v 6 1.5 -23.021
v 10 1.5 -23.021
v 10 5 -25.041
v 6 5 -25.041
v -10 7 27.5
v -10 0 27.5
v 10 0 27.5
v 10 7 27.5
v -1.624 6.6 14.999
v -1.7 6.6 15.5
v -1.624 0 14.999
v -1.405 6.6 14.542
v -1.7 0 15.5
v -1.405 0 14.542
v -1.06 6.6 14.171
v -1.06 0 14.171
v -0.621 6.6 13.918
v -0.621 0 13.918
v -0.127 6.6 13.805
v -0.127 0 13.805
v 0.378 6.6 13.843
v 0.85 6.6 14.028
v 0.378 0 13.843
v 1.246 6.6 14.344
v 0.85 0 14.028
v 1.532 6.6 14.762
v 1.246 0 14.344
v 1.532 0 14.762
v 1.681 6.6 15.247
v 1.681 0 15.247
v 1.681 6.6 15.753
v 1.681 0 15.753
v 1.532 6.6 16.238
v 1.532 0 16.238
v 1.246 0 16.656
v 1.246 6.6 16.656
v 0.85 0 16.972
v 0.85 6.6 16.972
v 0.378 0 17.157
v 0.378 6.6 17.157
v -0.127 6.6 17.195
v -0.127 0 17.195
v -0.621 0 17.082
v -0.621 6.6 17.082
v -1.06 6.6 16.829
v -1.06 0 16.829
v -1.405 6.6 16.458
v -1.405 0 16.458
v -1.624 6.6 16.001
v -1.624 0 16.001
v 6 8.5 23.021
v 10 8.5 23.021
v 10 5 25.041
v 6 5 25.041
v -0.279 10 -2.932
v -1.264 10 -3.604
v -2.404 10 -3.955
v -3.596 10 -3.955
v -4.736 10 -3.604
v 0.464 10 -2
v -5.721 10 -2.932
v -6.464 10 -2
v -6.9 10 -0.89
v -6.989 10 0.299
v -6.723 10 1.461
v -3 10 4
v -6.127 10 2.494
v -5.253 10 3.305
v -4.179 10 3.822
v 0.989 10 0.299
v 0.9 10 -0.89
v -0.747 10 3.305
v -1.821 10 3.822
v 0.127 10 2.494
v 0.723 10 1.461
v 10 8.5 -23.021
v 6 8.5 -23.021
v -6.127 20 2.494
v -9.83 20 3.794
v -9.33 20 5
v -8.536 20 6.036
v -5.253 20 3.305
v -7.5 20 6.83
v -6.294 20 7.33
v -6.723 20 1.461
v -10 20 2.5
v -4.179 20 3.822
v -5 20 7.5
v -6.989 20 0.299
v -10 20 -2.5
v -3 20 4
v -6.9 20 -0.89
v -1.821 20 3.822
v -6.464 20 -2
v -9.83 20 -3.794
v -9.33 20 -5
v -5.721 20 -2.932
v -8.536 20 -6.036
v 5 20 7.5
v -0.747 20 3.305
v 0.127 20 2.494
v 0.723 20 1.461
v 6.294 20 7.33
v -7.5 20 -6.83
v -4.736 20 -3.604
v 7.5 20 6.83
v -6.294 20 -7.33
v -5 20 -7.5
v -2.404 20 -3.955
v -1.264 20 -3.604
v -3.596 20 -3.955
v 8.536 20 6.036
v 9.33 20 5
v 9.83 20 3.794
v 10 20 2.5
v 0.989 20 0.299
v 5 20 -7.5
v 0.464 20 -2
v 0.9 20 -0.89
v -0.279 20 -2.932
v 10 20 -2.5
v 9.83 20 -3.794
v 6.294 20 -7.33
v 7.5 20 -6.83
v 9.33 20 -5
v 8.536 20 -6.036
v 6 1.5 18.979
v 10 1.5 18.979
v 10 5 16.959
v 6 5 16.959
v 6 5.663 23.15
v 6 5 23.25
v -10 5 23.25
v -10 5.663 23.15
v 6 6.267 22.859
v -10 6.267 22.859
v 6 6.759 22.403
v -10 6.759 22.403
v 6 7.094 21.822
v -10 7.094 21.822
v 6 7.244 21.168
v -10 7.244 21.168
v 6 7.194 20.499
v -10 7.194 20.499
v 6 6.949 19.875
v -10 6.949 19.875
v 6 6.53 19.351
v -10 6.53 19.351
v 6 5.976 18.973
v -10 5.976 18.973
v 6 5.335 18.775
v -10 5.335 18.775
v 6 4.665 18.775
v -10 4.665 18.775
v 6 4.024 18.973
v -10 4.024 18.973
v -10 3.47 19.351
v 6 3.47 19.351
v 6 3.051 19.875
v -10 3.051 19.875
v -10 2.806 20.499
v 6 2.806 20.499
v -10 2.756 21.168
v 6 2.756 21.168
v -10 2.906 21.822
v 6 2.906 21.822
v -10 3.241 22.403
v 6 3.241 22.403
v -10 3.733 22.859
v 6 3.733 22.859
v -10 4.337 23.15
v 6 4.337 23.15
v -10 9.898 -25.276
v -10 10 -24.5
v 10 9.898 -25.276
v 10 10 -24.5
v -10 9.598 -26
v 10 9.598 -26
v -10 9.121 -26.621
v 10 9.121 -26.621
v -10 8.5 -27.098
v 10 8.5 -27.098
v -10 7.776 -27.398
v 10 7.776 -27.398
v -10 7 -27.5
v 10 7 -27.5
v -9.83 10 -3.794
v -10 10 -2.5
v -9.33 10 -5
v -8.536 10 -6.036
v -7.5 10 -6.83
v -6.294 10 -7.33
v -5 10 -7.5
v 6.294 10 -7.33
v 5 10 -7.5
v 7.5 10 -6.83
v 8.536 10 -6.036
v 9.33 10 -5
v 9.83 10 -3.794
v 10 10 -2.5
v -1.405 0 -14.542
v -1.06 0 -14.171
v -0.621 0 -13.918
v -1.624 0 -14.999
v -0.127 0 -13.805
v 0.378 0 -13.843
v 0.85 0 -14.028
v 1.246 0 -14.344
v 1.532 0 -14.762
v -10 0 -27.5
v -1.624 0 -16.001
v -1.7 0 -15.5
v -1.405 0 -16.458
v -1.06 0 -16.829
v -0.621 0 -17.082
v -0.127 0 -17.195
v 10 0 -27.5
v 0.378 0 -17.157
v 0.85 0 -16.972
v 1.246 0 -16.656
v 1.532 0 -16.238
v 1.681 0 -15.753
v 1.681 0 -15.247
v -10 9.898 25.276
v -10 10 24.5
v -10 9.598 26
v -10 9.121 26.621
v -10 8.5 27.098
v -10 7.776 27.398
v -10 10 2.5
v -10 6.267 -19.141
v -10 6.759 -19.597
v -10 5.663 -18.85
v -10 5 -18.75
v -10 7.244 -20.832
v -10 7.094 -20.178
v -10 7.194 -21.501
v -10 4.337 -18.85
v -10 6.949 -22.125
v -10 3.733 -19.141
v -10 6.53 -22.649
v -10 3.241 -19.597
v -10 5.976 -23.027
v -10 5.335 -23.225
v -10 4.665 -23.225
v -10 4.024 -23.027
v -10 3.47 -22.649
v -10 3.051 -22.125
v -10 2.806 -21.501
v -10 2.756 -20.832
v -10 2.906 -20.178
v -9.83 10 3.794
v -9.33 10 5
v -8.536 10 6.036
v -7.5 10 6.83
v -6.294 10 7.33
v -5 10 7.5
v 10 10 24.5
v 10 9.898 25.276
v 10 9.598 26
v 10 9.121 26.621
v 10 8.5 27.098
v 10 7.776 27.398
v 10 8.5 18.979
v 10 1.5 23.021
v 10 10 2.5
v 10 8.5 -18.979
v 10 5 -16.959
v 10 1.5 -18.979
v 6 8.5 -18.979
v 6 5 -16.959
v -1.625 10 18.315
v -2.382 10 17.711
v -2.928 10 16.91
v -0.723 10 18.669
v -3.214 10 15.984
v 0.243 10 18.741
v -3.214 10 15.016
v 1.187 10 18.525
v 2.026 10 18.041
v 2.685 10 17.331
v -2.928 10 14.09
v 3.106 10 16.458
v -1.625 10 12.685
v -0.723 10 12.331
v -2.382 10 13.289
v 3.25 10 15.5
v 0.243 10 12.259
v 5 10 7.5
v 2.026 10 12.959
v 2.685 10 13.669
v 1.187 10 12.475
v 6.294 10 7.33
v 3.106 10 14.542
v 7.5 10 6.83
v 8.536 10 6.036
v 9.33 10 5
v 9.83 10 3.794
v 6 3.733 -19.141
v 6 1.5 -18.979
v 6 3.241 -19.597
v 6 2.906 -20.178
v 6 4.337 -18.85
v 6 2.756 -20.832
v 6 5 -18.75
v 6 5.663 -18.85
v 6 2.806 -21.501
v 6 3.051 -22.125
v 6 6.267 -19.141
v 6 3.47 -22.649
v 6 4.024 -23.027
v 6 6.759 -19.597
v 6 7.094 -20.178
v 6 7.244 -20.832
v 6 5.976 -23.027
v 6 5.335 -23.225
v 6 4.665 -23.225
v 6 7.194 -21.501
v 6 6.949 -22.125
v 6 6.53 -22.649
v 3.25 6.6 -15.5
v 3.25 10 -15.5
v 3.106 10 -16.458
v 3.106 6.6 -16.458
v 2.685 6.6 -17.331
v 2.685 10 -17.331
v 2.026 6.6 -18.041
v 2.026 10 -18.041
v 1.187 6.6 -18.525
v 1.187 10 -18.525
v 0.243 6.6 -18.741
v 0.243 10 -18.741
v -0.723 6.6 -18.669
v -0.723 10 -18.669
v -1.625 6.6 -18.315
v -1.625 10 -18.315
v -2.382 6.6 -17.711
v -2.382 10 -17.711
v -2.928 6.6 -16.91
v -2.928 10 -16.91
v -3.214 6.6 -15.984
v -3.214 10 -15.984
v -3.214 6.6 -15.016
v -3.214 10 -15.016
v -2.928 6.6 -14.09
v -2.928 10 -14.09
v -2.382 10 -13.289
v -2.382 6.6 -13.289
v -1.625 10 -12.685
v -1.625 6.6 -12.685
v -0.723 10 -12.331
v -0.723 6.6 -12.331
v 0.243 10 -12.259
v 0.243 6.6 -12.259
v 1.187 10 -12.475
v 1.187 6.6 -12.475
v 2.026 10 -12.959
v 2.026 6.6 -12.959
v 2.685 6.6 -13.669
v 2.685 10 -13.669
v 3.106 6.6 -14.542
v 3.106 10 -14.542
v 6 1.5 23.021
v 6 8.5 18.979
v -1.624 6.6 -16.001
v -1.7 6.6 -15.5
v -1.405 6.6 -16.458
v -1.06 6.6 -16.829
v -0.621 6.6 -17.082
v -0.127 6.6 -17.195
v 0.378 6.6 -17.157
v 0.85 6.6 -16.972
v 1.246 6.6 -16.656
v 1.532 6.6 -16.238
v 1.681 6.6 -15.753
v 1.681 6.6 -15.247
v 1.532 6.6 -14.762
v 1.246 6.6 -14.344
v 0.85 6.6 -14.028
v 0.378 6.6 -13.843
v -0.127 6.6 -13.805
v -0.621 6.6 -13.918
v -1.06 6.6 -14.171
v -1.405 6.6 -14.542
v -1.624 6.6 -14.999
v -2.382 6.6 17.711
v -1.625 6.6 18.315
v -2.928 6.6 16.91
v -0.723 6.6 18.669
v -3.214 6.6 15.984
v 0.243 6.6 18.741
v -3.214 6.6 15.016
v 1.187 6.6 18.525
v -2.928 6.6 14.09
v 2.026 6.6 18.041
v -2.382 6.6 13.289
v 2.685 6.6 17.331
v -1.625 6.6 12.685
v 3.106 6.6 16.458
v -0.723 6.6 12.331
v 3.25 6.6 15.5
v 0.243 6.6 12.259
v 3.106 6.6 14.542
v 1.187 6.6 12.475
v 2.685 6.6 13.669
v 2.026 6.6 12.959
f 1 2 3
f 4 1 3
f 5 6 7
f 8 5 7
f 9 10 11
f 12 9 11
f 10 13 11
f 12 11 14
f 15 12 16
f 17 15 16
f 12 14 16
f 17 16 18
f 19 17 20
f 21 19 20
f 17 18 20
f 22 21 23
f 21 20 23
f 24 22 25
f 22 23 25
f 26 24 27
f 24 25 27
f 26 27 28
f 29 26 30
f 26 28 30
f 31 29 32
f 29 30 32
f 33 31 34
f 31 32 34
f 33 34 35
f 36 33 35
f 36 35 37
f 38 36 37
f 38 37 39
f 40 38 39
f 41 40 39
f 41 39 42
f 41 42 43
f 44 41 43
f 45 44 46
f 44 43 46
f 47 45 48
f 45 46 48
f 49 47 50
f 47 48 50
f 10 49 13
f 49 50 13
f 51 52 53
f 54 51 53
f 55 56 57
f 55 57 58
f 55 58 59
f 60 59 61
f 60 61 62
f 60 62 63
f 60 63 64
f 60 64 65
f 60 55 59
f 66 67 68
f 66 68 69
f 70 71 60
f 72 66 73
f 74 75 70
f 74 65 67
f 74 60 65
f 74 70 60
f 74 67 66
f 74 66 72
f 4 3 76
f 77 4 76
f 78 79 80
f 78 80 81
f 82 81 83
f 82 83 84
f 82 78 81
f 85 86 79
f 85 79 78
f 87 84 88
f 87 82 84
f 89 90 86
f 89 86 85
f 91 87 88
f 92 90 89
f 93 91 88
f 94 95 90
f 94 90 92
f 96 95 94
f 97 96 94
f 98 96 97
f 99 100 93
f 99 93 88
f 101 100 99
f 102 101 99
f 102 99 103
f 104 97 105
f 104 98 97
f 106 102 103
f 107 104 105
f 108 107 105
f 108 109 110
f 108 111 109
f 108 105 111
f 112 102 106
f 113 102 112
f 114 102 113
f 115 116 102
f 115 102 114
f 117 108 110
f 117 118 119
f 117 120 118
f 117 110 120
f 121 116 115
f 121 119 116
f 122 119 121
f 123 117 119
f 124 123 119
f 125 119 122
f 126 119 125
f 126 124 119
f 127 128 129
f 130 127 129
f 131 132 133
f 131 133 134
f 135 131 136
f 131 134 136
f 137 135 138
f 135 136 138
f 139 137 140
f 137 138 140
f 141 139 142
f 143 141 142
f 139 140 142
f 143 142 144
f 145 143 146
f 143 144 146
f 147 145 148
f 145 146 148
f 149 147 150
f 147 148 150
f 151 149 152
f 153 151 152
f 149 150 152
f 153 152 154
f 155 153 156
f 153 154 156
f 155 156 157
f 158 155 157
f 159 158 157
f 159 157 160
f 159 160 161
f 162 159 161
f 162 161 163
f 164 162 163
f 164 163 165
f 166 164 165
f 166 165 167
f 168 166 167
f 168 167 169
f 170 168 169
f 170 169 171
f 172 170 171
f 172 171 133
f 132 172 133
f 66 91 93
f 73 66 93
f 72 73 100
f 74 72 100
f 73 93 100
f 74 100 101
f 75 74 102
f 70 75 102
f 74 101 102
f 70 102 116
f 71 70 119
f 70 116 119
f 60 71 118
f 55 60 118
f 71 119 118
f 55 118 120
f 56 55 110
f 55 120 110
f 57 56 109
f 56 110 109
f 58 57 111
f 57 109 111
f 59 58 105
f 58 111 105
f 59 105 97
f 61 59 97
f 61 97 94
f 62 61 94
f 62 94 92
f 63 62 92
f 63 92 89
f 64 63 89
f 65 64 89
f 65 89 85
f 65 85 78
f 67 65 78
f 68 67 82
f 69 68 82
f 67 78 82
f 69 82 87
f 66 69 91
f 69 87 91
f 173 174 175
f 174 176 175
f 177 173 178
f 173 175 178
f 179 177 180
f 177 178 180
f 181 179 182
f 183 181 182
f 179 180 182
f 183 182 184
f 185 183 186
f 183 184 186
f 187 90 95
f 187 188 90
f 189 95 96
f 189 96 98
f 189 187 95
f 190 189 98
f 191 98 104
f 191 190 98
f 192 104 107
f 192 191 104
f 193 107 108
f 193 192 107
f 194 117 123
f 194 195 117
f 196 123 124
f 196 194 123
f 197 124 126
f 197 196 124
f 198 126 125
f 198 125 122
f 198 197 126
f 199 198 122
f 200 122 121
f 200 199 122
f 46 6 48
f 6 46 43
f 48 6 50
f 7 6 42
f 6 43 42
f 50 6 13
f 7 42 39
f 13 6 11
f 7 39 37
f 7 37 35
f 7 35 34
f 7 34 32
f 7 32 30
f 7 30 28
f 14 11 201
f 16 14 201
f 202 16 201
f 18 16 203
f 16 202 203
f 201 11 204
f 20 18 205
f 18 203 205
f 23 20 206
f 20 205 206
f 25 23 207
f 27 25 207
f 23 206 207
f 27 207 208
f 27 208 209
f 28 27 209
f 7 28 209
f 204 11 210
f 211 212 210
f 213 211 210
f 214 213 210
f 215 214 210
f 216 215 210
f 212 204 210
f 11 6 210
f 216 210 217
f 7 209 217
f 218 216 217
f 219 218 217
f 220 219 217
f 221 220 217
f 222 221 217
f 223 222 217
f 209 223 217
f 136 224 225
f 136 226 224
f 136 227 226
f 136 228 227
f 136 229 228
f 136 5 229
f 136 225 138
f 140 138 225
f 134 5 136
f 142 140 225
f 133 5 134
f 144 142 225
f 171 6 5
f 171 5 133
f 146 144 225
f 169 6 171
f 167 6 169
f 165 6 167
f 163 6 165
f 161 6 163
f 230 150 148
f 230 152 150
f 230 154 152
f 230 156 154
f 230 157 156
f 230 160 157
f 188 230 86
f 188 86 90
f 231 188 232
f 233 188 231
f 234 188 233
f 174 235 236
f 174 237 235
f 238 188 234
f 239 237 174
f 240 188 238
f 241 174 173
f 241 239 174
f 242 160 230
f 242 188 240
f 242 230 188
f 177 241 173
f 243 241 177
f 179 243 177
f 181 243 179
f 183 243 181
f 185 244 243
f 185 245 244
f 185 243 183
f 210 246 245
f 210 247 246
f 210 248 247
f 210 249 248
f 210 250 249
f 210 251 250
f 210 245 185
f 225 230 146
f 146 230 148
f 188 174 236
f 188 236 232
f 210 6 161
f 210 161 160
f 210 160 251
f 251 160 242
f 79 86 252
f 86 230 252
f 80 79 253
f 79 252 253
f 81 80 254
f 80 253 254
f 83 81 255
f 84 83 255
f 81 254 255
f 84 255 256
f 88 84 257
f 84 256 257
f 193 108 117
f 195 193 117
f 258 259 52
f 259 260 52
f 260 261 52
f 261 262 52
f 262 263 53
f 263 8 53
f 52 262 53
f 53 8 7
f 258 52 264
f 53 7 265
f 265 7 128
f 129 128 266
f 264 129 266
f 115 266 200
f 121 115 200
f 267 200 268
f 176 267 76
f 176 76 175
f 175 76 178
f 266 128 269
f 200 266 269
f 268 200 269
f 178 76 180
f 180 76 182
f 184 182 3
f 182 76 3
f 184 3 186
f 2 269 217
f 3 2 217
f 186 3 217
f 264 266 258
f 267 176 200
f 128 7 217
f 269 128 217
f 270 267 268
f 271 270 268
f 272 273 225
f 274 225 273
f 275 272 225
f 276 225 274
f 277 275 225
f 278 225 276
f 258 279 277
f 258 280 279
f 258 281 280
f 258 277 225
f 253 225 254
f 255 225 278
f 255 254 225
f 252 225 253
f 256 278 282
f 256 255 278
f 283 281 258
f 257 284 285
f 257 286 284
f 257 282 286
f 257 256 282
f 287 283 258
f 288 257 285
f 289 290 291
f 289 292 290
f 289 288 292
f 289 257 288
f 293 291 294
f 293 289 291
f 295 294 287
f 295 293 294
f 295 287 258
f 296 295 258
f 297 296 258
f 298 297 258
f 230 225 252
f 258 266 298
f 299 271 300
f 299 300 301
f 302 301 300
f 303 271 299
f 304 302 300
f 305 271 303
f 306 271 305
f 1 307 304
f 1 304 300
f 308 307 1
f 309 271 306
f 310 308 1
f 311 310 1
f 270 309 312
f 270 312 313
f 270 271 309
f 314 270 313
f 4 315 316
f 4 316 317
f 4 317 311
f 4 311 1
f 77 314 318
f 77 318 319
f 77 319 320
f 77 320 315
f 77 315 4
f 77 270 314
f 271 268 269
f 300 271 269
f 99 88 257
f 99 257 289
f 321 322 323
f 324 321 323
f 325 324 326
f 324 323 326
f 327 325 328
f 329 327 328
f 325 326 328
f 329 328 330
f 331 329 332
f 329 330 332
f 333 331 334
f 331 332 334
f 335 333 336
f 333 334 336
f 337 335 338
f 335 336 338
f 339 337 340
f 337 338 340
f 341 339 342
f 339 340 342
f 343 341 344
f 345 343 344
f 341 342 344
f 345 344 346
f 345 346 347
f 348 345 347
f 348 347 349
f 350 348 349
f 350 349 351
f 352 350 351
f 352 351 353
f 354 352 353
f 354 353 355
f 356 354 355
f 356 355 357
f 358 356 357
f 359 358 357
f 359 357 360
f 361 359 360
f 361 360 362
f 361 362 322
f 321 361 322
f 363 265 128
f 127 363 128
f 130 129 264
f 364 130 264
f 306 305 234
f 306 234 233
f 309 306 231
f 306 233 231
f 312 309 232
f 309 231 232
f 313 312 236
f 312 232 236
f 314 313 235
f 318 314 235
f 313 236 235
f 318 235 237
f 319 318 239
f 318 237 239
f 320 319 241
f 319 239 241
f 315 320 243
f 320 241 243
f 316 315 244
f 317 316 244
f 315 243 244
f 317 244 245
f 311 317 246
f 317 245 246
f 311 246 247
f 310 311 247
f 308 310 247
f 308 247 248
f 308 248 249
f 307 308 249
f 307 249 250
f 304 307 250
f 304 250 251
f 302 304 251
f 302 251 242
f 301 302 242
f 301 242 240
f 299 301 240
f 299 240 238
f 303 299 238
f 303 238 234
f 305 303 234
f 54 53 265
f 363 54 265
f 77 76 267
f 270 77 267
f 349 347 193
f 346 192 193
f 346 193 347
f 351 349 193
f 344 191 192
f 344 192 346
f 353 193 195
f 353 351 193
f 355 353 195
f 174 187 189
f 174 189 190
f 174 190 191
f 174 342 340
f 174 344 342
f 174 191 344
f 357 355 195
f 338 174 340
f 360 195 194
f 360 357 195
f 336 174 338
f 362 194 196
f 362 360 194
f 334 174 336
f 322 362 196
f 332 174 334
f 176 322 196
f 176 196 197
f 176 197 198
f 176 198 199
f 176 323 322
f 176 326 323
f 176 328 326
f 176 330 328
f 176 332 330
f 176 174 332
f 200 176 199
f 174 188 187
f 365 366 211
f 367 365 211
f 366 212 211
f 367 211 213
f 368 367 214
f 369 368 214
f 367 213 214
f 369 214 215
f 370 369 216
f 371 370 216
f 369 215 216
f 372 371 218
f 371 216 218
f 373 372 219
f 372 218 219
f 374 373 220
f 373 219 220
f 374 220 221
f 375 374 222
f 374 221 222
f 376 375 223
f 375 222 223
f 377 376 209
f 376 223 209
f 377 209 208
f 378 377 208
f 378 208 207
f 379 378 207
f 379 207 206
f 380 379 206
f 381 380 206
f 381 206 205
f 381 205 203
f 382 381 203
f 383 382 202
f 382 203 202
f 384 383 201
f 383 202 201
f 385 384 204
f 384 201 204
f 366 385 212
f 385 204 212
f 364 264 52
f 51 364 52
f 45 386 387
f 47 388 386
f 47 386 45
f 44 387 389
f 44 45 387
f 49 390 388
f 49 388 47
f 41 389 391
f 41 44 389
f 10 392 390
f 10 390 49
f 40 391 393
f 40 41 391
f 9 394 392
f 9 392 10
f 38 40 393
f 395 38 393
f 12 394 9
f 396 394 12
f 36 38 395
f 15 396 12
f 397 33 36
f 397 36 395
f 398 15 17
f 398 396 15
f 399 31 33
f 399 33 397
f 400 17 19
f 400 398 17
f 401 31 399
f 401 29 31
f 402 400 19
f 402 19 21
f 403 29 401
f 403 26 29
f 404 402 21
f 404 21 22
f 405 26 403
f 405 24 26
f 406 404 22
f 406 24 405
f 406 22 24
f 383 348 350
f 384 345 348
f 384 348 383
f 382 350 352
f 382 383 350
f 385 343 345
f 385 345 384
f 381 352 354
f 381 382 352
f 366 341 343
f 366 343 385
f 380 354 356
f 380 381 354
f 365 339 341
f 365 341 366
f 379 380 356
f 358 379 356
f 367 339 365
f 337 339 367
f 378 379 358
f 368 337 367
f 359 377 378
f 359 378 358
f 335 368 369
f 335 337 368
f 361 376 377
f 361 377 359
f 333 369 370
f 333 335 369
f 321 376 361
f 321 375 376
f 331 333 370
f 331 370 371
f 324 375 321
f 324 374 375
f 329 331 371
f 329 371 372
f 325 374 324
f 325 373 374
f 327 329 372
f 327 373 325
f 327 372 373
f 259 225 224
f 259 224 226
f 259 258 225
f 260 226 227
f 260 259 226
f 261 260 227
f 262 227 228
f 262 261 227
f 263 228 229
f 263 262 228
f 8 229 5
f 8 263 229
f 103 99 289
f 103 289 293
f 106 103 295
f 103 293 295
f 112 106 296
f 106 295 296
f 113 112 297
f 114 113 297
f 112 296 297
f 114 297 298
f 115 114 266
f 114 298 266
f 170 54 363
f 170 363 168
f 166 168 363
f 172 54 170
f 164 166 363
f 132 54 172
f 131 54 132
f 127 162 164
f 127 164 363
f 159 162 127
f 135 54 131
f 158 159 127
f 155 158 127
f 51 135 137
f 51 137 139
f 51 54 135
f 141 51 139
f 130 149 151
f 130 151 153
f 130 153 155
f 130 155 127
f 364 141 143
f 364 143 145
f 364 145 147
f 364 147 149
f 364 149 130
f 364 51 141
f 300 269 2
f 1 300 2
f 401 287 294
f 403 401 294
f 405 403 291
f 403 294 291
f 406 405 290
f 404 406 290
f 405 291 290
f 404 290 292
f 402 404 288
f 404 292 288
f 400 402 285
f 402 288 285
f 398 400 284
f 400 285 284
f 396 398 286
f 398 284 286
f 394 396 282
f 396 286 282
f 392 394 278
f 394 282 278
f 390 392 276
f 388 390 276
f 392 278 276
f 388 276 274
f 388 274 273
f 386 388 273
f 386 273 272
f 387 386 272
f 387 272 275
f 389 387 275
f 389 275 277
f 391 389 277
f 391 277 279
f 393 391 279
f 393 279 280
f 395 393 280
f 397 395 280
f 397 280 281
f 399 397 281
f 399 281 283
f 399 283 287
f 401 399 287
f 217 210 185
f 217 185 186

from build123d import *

# Parameters (mm, degrees)
SKETCH1_W                                           = 20
SKETCH1_H                                           = 55
BOSS_EXTRUDE1_DEPTH                                 = 20
SKETCH2_R                                           = 4
CUT_EXTRUDE1_DEPTH                                  = 10
SKETCH3_W                                           = 20
SKETCH3_H                                           = 20
CUT_EXTRUDE2_DEPTH                                  = 10
CBORE_FOR_M3_HEX_SOCKET_HEAD_CAP_SCREW1_D           = 3.4
CBORE_FOR_M3_HEX_SOCKET_HEAD_CAP_SCREW1_CBORE_D     = 6.5
CBORE_FOR_M3_HEX_SOCKET_HEAD_CAP_SCREW1_CBORE_DEPTH = 3.4
FILLET2_R                                           = 5
SKETCH9_R                                           = 2.25
CUT_EXTRUDE5_DEPTH                                  = 40.449334595
CUT_EXTRUDE6_DEPTH                                  = 4
FILLET5_R                                           = 3


with BuildPart() as part:
    # Sketch1 → Boss-Extrude1 (new body)
    with BuildSketch(Plane(origin=(0, 0, 0), x_dir=(1, 0, 0), z_dir=(0, 1, 0))):
        Rectangle(SKETCH1_W, SKETCH1_H)
    extrude(amount=BOSS_EXTRUDE1_DEPTH)

    # Sketch2 → Cut-Extrude1 (cut)
    with BuildSketch(Plane(origin=(0, 20, 0), x_dir=(1, 0, 0), z_dir=(0, 1, 0))):
        with Locations(Location((-3, 0, 0), (0, 0, 270))):
            Circle(SKETCH2_R)
    extrude(amount=-CUT_EXTRUDE1_DEPTH, mode=Mode.SUBTRACT)

    # Sketch3 → Cut-Extrude2 (cut)
    with BuildSketch(Plane(origin=(0, 20, 0), x_dir=(1, 0, 0), z_dir=(0, 1, 0))):
        with Locations((0, -17.5)):
            Rectangle(SKETCH3_W, SKETCH3_H)
        with Locations((0, 17.5)):
            Rectangle(SKETCH3_W, SKETCH3_H)
    extrude(amount=-CUT_EXTRUDE2_DEPTH, mode=Mode.SUBTRACT)

    # CBORE for M3 Hex Socket Head Cap Screw1 (through all)
    with Locations(Plane(origin=(0, 10, 0), x_dir=(1, 0, 0), z_dir=(0, 1, 0))):
        with Locations((0, -15.5), (0, 15.5)):
            CounterBoreHole(CBORE_FOR_M3_HEX_SOCKET_HEAD_CAP_SCREW1_D / 2, CBORE_FOR_M3_HEX_SOCKET_HEAD_CAP_SCREW1_CBORE_D / 2, CBORE_FOR_M3_HEX_SOCKET_HEAD_CAP_SCREW1_CBORE_DEPTH)

    # Fillet2
    fillet2_edges = [part.edges().sort_by_distance(p)[0] for p in [
        (-10, 15, 7.5),
        (10, 15, 7.5),
        (-10, 15, -7.5),
        (10, 15, -7.5),
    ]]
    fillet(fillet2_edges, radius=FILLET2_R)

    # Sketch9 → Cut-Extrude5 (cut, through all)
    with BuildSketch(Plane.ZY.offset(10)):
        with Locations((-21, 5)):
            Circle(SKETCH9_R)
        with Locations((21, 5)):
            Circle(SKETCH9_R)
    extrude(amount=-CUT_EXTRUDE5_DEPTH, mode=Mode.SUBTRACT)

    # Sketch10 → Cut-Extrude6 (cut)
    with BuildSketch(Plane(origin=(10, 0, 0), x_dir=(0, 0, -1), z_dir=(1, 0, 0))):
        Polygon((-16.958548116, 5), (-18.979274058, 8.5), (-23.020725942, 8.5), (-25.041451884, 5), (-23.020725942, 1.5), (-18.979274058, 1.5), align=None)
        Polygon((16.958548116, 5), (18.979274058, 1.5), (23.020725942, 1.5), (25.041451884, 5), (23.020725942, 8.5), (18.979274058, 8.5), align=None)
    extrude(amount=-CUT_EXTRUDE6_DEPTH, mode=Mode.SUBTRACT)

    # Fillet5
    fillet5_edges = [part.edges().sort_by_distance(p)[0] for p in [
        (0, 10, 27.5),
        (0, 10, -27.5),
    ]]
    fillet(fillet5_edges, radius=FILLET5_R)


solid = part.part
